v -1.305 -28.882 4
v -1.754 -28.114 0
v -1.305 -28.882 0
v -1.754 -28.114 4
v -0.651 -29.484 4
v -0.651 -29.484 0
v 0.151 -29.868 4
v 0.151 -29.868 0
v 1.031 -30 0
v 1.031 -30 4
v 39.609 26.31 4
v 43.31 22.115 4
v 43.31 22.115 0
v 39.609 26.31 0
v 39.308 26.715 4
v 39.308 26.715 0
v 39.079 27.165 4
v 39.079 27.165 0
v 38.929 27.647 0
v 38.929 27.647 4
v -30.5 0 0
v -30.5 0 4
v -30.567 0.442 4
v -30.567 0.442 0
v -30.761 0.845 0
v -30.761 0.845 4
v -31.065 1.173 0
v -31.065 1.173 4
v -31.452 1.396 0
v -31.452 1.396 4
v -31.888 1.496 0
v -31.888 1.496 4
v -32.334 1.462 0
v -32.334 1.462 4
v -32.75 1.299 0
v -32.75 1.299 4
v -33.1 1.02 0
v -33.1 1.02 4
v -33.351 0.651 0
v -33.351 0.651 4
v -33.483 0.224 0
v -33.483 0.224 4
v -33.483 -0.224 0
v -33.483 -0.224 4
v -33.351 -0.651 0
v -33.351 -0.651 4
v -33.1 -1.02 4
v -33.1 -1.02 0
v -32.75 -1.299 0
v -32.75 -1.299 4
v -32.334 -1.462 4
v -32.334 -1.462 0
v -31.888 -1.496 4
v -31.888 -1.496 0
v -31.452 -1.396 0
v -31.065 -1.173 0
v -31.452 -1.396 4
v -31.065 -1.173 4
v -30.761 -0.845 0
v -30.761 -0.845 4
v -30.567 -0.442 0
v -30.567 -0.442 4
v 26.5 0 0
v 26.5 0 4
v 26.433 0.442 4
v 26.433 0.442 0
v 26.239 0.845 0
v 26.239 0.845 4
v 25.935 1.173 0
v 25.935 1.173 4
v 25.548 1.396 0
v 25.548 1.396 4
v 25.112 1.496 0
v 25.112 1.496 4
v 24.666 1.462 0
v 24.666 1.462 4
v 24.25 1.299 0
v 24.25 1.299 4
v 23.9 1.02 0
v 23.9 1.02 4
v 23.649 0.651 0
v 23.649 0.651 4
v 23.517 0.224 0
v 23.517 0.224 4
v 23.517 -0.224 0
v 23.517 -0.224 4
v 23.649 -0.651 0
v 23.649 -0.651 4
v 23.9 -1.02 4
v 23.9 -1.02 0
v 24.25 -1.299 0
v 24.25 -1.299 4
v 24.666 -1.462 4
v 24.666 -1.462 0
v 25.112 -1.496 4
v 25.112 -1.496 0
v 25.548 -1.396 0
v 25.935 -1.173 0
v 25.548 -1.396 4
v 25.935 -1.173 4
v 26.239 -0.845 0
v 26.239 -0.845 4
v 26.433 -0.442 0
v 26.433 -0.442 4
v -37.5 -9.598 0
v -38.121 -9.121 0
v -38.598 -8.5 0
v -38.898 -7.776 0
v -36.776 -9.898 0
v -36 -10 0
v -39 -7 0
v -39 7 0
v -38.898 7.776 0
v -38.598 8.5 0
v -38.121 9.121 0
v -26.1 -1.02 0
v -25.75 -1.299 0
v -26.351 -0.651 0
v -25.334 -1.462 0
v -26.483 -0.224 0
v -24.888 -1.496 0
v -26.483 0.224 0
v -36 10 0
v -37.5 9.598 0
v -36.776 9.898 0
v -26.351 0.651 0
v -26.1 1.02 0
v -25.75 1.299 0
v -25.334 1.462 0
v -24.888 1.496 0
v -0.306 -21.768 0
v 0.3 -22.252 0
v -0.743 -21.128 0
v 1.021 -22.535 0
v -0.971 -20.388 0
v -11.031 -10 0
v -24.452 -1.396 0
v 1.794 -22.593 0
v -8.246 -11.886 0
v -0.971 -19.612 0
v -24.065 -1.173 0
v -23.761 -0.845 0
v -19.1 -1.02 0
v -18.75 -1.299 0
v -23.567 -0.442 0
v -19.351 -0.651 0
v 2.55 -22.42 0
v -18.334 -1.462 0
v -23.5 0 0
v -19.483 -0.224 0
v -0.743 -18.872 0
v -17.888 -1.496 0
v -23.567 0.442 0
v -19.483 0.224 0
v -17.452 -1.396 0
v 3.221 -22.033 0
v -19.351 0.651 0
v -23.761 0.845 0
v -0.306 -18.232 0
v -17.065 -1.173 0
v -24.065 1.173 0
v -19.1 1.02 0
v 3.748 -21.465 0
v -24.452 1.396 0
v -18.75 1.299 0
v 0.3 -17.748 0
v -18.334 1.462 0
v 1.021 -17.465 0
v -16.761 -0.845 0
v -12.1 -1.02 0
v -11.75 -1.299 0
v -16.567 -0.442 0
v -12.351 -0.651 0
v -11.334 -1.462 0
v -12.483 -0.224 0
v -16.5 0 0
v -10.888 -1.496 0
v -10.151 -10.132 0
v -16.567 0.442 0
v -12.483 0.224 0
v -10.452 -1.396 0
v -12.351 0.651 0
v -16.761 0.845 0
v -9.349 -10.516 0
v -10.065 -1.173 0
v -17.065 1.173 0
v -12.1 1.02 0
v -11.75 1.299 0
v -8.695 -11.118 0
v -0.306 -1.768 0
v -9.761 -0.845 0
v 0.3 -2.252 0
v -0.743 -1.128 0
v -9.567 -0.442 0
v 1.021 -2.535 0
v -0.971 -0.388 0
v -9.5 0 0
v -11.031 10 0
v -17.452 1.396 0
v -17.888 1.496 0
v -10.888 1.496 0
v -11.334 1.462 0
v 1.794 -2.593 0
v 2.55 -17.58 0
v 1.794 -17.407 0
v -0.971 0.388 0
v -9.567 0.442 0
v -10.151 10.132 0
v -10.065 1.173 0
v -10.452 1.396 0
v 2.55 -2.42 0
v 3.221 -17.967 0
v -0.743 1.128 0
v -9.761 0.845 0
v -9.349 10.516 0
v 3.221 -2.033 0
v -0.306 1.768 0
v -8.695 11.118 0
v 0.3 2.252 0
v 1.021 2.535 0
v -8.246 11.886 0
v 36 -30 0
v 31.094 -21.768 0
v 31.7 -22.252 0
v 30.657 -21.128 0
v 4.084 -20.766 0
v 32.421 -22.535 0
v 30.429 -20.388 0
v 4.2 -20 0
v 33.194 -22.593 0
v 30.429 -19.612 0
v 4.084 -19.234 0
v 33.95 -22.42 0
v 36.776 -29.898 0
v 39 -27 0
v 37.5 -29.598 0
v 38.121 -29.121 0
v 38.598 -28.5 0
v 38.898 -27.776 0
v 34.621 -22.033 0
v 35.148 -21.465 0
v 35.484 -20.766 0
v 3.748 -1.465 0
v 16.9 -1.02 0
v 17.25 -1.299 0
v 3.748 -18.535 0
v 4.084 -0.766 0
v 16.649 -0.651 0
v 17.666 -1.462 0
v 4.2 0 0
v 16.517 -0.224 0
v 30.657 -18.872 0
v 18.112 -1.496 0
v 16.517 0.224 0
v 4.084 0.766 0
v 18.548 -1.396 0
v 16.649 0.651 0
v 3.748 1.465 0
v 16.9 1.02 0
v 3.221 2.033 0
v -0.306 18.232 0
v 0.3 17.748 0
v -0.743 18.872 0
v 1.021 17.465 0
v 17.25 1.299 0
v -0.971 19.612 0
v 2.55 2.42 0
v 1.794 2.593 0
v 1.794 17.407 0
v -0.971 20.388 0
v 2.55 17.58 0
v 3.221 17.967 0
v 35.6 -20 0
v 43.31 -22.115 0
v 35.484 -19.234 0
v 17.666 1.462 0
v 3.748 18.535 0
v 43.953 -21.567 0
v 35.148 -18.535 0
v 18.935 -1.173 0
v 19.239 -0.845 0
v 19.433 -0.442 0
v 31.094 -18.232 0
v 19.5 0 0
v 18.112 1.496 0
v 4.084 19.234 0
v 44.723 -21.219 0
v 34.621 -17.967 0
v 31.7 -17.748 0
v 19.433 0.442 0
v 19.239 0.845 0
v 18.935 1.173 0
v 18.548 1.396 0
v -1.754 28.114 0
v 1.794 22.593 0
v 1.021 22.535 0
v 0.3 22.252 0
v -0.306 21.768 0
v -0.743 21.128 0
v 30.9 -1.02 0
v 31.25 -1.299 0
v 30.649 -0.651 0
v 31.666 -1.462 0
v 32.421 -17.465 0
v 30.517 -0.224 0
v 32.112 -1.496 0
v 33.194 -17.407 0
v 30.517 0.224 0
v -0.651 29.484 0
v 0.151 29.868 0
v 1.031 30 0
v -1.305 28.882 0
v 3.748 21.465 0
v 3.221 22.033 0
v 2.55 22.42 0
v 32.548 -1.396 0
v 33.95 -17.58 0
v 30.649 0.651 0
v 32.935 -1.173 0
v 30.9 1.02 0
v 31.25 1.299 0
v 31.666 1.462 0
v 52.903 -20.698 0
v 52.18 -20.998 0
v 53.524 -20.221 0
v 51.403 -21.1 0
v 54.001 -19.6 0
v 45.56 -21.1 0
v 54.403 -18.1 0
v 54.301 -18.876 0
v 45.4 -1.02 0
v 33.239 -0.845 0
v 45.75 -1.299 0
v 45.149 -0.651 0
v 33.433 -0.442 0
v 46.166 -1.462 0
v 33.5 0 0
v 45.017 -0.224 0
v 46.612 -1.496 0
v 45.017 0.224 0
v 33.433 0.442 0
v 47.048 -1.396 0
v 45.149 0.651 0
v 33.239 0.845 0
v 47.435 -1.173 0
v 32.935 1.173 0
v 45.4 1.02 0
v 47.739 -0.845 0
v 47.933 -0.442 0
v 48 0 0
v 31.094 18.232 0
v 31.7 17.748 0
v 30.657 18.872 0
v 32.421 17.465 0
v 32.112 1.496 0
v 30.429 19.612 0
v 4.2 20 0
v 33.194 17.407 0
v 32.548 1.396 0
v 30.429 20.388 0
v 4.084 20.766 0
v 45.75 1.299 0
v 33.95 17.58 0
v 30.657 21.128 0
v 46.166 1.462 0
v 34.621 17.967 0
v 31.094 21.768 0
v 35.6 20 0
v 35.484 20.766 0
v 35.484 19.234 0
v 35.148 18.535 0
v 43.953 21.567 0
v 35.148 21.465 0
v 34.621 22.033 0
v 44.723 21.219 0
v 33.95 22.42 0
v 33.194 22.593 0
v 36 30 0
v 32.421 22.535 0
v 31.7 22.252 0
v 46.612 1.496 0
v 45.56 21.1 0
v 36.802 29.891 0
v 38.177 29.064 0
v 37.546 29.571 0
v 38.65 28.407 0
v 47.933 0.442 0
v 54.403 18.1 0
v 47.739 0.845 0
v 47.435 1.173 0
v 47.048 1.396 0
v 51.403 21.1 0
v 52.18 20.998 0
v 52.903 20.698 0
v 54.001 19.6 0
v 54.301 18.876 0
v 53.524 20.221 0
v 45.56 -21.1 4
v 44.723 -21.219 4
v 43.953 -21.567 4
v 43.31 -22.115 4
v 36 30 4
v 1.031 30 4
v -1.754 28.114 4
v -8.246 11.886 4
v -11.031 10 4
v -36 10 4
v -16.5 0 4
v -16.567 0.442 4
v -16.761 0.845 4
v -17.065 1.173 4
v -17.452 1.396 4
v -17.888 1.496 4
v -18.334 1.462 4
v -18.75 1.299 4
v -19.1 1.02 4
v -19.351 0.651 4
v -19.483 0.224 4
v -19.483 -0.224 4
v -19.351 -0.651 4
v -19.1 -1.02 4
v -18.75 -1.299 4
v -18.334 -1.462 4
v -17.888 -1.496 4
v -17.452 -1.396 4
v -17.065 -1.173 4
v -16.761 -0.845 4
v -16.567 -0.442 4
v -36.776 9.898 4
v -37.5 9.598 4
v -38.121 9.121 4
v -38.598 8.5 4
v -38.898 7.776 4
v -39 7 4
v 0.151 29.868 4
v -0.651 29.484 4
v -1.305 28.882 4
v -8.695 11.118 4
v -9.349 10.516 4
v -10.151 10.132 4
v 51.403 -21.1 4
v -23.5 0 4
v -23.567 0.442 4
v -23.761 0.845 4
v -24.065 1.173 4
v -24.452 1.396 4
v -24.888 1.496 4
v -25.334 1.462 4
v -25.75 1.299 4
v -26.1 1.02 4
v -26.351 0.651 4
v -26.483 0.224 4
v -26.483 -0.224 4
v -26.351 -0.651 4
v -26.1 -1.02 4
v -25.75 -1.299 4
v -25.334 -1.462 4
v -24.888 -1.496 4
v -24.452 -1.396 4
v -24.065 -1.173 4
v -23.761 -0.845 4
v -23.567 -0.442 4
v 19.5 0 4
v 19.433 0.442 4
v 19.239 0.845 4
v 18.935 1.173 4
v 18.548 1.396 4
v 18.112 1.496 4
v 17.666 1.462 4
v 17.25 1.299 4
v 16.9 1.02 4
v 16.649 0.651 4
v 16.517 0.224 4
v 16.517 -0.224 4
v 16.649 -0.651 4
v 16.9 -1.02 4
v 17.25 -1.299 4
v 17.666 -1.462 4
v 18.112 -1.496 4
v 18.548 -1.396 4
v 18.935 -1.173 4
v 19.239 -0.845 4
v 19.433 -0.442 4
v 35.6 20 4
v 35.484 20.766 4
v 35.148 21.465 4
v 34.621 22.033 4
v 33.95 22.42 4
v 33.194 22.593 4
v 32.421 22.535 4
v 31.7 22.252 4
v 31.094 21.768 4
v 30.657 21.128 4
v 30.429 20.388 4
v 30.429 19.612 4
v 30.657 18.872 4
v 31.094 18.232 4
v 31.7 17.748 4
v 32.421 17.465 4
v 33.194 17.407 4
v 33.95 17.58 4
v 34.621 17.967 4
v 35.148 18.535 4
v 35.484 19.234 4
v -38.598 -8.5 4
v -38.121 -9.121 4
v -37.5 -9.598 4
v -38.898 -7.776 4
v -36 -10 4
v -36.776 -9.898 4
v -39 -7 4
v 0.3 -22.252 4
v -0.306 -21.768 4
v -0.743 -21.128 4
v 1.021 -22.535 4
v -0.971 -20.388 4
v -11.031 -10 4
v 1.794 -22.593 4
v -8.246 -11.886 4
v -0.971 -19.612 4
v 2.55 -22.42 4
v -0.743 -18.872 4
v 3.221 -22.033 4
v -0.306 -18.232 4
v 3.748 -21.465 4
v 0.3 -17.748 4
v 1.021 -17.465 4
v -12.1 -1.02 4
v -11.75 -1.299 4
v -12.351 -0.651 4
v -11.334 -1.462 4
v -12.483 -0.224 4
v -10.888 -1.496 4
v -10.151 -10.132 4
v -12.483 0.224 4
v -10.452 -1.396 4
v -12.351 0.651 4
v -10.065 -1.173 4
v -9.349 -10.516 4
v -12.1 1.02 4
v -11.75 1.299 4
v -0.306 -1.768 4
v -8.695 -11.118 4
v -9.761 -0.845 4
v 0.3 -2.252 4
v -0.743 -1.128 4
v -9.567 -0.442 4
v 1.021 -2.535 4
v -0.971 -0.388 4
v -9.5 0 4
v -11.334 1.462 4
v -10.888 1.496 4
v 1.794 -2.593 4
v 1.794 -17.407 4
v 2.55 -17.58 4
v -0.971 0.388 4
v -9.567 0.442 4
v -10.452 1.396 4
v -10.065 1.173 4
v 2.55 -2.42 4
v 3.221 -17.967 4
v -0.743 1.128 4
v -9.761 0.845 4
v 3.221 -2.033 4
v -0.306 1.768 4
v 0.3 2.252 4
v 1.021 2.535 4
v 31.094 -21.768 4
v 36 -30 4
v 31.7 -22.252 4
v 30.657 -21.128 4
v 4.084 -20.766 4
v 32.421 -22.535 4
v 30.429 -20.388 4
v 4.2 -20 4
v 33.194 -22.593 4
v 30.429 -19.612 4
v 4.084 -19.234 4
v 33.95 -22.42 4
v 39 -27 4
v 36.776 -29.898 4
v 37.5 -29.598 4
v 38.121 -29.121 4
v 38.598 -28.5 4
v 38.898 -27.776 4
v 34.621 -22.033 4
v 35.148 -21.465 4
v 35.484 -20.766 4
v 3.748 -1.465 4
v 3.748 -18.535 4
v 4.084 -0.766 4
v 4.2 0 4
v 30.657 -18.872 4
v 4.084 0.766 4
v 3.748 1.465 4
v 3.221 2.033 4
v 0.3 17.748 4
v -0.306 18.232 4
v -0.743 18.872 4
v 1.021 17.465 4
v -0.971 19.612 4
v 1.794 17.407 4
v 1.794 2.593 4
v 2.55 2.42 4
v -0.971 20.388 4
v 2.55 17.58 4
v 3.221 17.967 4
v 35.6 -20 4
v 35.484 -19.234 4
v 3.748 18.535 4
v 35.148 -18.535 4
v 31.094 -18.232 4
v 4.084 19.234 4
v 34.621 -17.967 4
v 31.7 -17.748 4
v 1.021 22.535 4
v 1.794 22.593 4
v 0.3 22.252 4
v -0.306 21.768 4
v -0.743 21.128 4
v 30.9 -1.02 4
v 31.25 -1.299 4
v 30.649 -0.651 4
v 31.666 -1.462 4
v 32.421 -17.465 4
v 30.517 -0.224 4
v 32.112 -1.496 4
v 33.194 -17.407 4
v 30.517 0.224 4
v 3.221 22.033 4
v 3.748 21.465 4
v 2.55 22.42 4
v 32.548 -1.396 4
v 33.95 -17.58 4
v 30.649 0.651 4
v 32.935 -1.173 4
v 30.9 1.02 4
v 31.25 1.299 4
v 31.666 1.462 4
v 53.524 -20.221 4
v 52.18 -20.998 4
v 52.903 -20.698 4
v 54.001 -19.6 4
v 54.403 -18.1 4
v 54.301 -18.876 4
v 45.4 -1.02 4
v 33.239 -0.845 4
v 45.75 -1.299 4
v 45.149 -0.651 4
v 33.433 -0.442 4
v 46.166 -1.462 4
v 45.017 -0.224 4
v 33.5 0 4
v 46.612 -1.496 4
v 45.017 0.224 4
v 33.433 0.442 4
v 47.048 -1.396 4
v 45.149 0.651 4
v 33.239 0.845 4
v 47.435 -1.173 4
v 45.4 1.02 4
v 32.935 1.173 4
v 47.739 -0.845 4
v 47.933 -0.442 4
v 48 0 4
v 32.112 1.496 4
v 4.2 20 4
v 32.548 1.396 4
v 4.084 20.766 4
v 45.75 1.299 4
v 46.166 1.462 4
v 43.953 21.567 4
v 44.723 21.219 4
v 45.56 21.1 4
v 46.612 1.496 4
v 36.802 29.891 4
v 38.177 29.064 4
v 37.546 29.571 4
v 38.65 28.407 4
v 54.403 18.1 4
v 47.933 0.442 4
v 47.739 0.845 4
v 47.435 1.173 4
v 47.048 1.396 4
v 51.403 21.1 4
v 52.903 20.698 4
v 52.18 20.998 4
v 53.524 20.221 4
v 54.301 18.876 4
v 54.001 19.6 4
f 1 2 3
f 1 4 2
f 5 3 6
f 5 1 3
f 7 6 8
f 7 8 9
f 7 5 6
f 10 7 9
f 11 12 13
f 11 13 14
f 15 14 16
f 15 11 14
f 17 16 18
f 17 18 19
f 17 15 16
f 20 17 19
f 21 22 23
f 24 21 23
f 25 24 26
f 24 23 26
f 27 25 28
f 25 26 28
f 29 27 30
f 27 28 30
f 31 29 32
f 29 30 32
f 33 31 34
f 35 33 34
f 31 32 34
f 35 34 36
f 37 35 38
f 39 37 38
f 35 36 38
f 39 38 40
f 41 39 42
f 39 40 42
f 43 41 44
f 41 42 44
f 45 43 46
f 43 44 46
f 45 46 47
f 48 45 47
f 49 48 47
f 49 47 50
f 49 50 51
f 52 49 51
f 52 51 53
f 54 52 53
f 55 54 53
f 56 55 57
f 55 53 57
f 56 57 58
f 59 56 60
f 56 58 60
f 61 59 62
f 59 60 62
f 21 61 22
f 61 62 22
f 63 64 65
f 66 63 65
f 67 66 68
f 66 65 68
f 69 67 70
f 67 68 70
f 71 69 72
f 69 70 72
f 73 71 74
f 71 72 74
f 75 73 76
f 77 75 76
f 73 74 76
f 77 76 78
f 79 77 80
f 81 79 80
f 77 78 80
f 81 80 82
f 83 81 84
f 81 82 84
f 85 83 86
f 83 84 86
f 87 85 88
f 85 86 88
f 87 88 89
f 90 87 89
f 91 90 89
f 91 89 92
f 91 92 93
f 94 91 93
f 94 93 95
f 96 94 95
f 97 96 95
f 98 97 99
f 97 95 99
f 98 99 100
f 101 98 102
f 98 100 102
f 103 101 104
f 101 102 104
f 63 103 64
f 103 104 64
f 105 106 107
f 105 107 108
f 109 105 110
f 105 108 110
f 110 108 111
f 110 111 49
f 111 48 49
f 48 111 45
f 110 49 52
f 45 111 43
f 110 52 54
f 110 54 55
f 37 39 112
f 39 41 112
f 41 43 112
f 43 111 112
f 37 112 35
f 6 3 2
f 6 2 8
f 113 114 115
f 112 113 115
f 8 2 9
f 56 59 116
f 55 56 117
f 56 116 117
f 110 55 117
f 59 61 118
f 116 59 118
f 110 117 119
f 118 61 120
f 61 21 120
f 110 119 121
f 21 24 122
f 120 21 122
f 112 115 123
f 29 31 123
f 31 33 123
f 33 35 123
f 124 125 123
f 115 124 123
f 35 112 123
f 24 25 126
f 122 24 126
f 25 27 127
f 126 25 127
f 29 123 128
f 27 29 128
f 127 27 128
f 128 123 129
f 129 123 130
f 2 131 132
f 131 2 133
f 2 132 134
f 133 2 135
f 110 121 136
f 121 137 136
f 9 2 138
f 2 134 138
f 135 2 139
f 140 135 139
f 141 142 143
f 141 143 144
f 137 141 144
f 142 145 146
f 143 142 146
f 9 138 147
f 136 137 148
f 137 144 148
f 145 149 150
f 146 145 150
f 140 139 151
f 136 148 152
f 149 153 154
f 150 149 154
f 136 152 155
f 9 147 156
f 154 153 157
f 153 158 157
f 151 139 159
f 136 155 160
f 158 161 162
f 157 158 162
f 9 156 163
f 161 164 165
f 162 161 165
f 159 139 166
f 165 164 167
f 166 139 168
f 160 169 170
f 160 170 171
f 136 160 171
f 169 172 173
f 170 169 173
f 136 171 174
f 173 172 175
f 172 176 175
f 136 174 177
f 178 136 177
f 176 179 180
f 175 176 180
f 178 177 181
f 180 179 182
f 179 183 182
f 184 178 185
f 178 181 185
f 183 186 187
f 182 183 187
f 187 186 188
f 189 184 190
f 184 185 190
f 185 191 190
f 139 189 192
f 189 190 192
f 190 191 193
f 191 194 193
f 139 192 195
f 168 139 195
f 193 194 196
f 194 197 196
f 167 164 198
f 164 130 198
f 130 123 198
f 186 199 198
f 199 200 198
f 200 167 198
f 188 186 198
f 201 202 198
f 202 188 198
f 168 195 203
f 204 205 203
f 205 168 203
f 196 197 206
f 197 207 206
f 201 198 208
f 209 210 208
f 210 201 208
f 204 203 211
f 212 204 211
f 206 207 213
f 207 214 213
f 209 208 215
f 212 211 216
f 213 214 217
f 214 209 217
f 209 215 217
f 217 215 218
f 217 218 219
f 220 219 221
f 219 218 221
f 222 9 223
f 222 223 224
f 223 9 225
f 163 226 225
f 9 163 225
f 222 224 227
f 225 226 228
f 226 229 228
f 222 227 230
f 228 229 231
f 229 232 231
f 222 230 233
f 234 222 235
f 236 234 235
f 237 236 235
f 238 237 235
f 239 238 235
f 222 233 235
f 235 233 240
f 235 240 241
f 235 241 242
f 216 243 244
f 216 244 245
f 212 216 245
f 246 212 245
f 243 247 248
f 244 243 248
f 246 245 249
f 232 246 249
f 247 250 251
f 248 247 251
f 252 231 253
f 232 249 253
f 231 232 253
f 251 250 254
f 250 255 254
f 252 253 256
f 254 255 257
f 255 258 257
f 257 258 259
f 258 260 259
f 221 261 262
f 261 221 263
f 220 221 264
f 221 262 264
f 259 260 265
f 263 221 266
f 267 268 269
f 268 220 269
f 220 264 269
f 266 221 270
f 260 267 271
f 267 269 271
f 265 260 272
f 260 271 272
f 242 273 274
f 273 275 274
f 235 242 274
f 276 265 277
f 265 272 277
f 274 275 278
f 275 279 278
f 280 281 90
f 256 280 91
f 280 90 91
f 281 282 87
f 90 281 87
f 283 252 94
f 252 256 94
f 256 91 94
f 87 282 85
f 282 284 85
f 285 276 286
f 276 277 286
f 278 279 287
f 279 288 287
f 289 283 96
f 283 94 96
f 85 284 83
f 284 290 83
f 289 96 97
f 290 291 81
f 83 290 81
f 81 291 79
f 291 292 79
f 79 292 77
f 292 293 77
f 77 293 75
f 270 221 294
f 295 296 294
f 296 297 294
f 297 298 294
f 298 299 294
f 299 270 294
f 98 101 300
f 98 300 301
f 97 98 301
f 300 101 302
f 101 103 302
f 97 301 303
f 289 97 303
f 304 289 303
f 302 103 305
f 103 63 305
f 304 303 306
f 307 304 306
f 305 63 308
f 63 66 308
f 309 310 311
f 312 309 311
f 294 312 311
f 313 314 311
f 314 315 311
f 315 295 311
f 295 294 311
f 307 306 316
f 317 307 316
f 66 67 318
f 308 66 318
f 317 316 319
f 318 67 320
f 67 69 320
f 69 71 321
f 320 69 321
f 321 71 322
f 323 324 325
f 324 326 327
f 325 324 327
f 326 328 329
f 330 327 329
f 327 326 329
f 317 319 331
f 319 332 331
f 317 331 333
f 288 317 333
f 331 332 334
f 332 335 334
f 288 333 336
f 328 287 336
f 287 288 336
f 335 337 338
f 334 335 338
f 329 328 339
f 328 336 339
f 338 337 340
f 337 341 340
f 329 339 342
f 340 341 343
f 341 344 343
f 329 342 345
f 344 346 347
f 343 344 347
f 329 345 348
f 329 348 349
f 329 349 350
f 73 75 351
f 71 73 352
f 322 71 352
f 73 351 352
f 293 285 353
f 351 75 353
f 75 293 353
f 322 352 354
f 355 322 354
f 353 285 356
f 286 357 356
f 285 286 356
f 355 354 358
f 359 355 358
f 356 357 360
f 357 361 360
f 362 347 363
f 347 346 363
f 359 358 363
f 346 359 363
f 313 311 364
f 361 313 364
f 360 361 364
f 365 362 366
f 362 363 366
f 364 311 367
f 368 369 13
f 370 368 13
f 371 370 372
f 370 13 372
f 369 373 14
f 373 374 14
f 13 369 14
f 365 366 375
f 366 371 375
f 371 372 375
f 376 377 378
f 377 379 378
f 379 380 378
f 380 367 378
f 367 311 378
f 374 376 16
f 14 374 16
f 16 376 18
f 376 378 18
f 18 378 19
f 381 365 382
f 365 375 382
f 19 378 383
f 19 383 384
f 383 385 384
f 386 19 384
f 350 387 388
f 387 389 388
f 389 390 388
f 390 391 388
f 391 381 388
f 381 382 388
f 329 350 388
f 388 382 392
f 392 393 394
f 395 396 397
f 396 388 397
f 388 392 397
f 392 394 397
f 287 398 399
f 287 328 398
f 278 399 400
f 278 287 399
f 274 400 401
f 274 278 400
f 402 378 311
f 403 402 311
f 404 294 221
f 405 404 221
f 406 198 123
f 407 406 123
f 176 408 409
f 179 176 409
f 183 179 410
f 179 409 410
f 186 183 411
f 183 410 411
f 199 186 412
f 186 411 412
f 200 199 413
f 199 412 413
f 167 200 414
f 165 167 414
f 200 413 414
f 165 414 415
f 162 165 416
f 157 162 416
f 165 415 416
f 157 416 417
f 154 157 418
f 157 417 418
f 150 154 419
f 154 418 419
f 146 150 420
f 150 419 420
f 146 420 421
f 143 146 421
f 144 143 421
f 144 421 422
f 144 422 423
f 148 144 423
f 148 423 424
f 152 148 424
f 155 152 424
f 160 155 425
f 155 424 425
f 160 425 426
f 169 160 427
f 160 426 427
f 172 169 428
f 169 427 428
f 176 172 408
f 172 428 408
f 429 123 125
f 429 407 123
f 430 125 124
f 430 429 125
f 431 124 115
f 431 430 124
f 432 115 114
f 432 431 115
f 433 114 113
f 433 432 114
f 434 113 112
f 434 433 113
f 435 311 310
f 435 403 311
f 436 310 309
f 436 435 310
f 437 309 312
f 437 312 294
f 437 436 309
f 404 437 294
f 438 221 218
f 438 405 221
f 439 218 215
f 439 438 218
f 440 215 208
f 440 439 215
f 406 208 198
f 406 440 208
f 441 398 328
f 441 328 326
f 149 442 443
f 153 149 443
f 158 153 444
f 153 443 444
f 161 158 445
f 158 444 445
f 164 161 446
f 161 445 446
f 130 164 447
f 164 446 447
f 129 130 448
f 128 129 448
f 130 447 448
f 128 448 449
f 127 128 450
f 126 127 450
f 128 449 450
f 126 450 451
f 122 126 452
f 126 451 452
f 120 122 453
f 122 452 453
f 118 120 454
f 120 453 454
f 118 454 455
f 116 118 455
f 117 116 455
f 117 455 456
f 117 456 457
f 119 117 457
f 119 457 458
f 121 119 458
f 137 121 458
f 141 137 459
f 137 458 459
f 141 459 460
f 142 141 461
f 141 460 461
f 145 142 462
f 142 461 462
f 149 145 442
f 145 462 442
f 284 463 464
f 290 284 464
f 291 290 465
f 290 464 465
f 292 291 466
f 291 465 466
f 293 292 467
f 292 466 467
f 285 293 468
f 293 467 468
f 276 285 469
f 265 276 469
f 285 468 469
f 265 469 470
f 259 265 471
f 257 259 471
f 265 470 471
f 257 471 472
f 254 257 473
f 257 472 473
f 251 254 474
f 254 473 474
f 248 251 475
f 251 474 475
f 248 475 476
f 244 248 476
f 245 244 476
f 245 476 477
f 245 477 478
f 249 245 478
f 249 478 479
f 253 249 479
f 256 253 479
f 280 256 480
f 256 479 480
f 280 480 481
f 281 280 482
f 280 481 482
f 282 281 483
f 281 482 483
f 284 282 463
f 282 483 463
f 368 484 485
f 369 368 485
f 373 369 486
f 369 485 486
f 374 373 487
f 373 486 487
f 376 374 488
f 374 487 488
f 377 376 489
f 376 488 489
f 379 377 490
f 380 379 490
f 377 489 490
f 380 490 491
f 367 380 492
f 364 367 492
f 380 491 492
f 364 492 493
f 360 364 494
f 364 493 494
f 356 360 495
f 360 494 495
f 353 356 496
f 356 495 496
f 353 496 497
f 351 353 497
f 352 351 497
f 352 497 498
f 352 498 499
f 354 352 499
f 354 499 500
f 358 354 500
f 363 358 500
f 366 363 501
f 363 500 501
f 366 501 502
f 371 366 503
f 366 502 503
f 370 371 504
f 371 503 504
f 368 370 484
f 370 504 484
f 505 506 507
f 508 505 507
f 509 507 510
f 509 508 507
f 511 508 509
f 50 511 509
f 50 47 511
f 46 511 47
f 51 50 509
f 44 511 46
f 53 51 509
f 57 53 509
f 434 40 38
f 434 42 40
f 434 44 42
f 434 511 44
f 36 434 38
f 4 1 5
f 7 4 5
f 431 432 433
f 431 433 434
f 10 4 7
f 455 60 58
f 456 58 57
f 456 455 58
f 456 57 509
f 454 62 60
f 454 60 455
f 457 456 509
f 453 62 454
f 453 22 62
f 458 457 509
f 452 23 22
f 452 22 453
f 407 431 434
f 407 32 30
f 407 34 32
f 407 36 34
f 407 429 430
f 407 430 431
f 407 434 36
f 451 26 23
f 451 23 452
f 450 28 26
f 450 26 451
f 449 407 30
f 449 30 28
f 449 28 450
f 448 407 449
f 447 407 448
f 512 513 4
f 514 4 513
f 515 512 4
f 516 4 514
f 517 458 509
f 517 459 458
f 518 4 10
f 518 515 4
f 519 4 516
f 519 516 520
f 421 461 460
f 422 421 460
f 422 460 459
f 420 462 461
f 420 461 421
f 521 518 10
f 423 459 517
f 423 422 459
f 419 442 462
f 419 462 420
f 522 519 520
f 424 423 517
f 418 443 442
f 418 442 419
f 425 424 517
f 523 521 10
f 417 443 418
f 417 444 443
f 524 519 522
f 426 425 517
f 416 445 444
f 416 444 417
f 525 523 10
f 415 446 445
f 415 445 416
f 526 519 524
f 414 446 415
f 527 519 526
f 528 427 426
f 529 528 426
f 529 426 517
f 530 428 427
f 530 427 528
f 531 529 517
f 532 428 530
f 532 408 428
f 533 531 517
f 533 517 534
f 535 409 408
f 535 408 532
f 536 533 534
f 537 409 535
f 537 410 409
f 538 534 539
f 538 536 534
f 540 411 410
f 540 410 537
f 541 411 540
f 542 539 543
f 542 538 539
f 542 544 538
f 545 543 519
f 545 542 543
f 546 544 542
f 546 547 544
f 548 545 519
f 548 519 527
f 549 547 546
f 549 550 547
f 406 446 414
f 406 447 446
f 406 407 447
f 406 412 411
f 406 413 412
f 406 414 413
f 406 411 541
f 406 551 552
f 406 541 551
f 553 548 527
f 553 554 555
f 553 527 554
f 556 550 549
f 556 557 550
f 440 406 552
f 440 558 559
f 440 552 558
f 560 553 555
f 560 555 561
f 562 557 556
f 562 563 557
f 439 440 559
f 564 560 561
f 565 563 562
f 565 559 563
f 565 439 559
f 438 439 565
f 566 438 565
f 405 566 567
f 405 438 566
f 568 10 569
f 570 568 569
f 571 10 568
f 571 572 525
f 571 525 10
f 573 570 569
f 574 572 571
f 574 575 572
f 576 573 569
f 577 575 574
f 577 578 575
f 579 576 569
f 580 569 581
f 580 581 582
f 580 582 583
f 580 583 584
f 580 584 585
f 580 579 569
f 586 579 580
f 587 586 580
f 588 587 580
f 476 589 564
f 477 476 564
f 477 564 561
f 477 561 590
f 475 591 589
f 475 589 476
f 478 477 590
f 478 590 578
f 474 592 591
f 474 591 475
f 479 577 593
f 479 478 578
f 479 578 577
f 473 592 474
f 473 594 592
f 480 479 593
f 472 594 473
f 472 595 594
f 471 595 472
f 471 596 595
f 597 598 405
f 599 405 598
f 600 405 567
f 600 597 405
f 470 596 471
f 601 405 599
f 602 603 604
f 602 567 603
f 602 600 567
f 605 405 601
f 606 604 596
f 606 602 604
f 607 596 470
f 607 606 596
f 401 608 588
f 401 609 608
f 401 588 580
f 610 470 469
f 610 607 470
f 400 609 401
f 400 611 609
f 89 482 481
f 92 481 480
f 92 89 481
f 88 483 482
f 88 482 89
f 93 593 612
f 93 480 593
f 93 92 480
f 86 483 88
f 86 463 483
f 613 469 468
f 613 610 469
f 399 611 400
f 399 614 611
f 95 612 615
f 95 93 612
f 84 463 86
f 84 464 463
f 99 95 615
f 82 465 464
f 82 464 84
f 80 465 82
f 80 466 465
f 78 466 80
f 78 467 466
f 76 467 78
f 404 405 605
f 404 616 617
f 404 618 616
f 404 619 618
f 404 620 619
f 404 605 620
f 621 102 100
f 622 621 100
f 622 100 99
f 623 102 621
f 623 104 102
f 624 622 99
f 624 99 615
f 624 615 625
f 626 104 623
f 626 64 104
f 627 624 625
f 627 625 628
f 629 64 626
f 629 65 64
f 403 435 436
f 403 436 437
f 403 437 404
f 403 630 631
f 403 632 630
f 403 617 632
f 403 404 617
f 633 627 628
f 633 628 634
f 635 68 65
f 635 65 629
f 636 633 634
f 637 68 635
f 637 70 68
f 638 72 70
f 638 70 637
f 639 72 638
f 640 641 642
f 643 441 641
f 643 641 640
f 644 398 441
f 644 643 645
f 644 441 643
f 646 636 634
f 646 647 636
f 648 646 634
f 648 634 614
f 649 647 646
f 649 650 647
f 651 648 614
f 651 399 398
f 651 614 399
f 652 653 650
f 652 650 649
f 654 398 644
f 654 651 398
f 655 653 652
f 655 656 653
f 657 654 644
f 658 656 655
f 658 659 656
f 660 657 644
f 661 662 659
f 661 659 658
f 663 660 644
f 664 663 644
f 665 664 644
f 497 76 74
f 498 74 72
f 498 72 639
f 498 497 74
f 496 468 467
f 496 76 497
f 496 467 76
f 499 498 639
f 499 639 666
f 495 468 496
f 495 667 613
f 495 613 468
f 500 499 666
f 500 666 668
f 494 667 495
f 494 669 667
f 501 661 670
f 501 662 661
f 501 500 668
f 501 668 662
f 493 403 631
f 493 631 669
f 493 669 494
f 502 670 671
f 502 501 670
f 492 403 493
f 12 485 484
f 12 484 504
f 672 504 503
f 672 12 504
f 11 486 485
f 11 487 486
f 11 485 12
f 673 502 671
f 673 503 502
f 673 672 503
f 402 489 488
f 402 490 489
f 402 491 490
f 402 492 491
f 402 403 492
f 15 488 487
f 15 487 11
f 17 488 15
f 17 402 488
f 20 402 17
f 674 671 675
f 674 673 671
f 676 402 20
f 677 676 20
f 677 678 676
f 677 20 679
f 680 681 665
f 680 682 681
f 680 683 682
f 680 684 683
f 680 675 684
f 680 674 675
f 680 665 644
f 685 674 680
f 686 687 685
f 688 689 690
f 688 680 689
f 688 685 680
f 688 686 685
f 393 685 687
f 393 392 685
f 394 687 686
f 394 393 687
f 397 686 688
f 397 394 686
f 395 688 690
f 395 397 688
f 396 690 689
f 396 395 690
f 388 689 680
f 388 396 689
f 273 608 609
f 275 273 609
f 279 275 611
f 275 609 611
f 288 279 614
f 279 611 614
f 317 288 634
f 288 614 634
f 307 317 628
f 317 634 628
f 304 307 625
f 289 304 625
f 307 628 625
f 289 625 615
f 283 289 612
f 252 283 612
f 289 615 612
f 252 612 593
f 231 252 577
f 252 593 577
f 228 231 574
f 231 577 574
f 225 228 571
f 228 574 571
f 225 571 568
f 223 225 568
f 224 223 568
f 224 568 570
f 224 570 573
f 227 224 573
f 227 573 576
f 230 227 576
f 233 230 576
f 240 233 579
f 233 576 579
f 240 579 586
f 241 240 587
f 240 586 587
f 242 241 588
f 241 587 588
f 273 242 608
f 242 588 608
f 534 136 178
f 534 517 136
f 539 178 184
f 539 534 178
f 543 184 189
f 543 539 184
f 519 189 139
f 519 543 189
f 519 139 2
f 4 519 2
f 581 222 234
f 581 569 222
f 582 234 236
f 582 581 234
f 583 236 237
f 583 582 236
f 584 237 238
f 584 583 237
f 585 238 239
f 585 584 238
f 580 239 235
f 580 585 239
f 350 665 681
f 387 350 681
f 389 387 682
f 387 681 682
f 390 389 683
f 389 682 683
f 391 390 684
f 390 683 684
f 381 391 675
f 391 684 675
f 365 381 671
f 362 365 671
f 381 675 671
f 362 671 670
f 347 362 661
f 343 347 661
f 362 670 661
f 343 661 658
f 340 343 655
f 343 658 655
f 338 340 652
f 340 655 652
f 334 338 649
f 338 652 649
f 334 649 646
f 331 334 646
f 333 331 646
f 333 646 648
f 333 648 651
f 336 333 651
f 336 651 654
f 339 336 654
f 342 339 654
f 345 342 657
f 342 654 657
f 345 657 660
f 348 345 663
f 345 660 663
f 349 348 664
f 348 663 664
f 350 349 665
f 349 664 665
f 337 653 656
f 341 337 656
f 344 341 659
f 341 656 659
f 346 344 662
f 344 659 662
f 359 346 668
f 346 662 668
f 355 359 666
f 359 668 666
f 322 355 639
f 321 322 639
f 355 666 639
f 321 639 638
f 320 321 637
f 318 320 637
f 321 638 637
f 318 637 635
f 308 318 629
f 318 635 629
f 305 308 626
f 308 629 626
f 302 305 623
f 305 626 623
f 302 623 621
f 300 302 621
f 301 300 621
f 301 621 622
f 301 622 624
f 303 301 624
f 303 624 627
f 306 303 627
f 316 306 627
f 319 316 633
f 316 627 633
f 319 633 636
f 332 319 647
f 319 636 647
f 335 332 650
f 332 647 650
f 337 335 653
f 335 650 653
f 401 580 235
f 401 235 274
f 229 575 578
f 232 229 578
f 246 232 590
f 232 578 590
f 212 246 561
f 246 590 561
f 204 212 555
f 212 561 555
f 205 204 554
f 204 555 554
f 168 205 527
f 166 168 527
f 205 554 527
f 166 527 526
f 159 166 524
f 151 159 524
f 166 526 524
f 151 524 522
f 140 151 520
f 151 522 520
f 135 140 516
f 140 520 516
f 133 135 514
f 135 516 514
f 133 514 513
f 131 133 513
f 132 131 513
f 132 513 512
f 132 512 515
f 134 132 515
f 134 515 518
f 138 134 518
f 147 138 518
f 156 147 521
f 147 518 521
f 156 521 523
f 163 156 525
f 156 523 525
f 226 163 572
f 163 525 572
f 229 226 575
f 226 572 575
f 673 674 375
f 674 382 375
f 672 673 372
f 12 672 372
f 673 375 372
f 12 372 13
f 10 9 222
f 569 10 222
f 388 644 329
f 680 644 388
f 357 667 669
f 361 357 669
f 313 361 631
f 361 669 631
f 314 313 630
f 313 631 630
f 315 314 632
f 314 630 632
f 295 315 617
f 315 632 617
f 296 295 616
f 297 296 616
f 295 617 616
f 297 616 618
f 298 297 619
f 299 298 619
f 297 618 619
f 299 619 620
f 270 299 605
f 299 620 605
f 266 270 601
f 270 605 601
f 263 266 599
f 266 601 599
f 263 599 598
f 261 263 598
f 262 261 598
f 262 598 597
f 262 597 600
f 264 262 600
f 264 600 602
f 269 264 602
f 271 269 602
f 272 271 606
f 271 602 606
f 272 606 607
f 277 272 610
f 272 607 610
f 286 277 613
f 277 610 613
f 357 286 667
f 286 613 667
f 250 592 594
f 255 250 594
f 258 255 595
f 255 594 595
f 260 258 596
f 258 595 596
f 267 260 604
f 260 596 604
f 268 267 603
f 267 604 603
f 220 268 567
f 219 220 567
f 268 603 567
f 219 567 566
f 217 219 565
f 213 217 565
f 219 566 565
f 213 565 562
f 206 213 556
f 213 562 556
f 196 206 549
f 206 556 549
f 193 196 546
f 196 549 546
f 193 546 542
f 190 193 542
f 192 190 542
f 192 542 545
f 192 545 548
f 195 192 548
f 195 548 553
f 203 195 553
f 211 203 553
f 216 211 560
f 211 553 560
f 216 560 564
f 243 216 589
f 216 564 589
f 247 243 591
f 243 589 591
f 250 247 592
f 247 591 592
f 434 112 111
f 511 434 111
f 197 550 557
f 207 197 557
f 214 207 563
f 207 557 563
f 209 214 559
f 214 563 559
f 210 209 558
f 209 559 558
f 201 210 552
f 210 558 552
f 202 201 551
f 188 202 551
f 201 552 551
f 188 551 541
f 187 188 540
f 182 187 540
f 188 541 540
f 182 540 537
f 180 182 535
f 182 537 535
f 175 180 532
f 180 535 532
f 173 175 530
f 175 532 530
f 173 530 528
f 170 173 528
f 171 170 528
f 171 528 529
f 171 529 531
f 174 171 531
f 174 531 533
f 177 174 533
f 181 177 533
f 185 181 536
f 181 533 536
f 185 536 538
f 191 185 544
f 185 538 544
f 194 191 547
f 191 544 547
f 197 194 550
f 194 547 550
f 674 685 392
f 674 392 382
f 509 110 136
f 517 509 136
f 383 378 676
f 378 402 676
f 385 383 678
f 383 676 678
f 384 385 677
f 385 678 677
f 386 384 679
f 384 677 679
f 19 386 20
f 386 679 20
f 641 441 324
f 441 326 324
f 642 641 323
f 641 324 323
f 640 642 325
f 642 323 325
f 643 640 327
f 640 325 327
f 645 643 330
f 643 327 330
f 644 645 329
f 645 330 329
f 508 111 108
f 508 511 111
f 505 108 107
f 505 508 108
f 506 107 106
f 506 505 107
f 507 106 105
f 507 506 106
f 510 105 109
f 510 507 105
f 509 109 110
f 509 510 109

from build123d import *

# Parameters (mm, degrees)
BOSS_EXTRUDE1_DEPTH = 4
FILLET1_R           = 3
SKETCH3_R           = 2.6
CUT_EXTRUDE1_DEPTH  = 4
SKETCH4_R           = 1.5
CUT_EXTRUDE2_DEPTH  = 4
SKETCH5_W           = 15
SKETCH5_H           = 20
BOSS_EXTRUDE2_DEPTH = 4
BOSS_EXTRUDE3_DEPTH = 4
SKETCH7_R           = 1.5
CUT_EXTRUDE3_DEPTH  = 4
BOSS_EXTRUDE4_DEPTH = 4
SKETCH10_R          = 11.5
CUT_EXTRUDE4_DEPTH  = 4
SKETCH14_R          = 1.5
CUT_EXTRUDE5_DEPTH  = 4
FILLET2_R           = 3
SKETCH17_W          = 41.796836064
SKETCH17_H          = 42.2
CUT_EXTRUDE6_DEPTH  = 10
FILLET3_R           = 3


with BuildPart() as part:
    # Sketch1 → Boss-Extrude1 (new body)
    with BuildSketch(Plane.XY):
        Polygon((39, 10), (39, 30), (-1, 30), (-9, 10), (-39, 10), (-39, -10), (-9, -10), (-1, -30), (39, -30), (39, -10), align=None)
    extrude(amount=BOSS_EXTRUDE1_DEPTH)

    # Fillet1
    fillet1_edges = [part.edges().sort_by_distance(p)[0] for p in [
        (39, -30, 2),
        (-1, -30, 2),
        (-9, -10, 2),
        (-39, -10, 2),
        (-39, 10, 2),
        (-9, 10, 2),
        (-1, 30, 2),
        (39, 30, 2),
    ]]
    fillet(fillet1_edges, radius=FILLET1_R)

    # Sketch3 → Cut-Extrude1 (cut)
    with BuildSketch(Plane.XY.offset(4)):
        with Locations((33, 20)):
            Circle(SKETCH3_R)
        with Locations((1.6, 20)):
            Circle(SKETCH3_R)
        with Locations((33, -20)):
            Circle(SKETCH3_R)
        with Locations((1.6, -20)):
            Circle(SKETCH3_R)
        with Locations((1.6, 0)):
            Circle(SKETCH3_R)
    extrude(amount=-CUT_EXTRUDE1_DEPTH, mode=Mode.SUBTRACT)

    # Sketch4 → Cut-Extrude2 (cut)
    with BuildSketch(Plane.XY.offset(4)):
        with Locations((-32, 0)):
            Circle(SKETCH4_R)
        with Locations((-25, 0)):
            Circle(SKETCH4_R)
        with Locations((-18, 0)):
            Circle(SKETCH4_R)
        with Locations((-11, 0)):
            Circle(SKETCH4_R)
        with Locations((32, 0)):
            Circle(SKETCH4_R)
        with Locations((25, 0)):
            Circle(SKETCH4_R)
        with Locations((18, 0)):
            Circle(SKETCH4_R)
    extrude(amount=-CUT_EXTRUDE2_DEPTH, mode=Mode.SUBTRACT)

    # Sketch5 → Boss-Extrude2 (add)
    with BuildSketch(Plane.XY.offset(4)):
        with Locations((46.5, 0)):
            Rectangle(SKETCH5_W, SKETCH5_H)
    extrude(amount=-BOSS_EXTRUDE2_DEPTH)

    # Sketch6 → Boss-Extrude3 (add)
    with BuildSketch(Plane.XY.offset(4)):
        Polygon((39, 10), (54, 10), (39, 27), align=None)
        Polygon((54, -10), (39, -10), (39, -27), align=None)
    extrude(amount=-BOSS_EXTRUDE3_DEPTH)

    # Sketch7 → Cut-Extrude3 (cut)
    with BuildSketch(Plane.XY.offset(4)):
        with Locations((46.5, 0)):
            Circle(SKETCH7_R)
    extrude(amount=-CUT_EXTRUDE3_DEPTH, mode=Mode.SUBTRACT)

    # Sketch8 → Boss-Extrude4 (add)
    with BuildSketch(Plane.XY.offset(4)):
        Polygon((54, -10), (54, -21.1), (96.2, -21.1), (96.2, 21.1), (54, 21.1), (54, 10), align=None)
        Polygon((44.205882353, 21.1), (54, 10), (54, 21.1), align=None)
        Polygon((44.205882353, -21.1), (54, -21.1), (54, -10), align=None)
    extrude(amount=-BOSS_EXTRUDE4_DEPTH)

    # Sketch10 → Cut-Extrude4 (cut)
    with BuildSketch(Plane.XY.offset(4)):
        with Locations((74.8, 0)):
            Circle(SKETCH10_R)
    extrude(amount=-CUT_EXTRUDE4_DEPTH, mode=Mode.SUBTRACT)

    # Sketch14 → Cut-Extrude5 (cut)
    with BuildSketch(Plane.XY.offset(4)):
        with Locations((90.674547238, 15.874547238)):
            Circle(SKETCH14_R)
        with Locations((58.925452762, -15.874547238)):
            Circle(SKETCH14_R)
        with Locations((58.925452762, 15.874547238)):
            Circle(SKETCH14_R)
        with Locations((90.674547238, -15.874547238)):
            Circle(SKETCH14_R)
    extrude(amount=-CUT_EXTRUDE5_DEPTH, mode=Mode.SUBTRACT)

    # Fillet2
    fillet2_edges = [part.edges().sort_by_distance(p)[0] for p in [
        (96.2, -21.1, 2),
        (44.205882353, -21.1, 2),
        (44.205882353, 21.1, 2),
        (96.2, 21.1, 2),
        (39, 27, 2),
    ]]
    fillet(fillet2_edges, radius=FILLET2_R)

    # Sketch17 → Cut-Extrude6 (cut)
    with BuildSketch(Plane.XY.offset(4)):
        with Locations((75.301581968, 0)):
            Rectangle(SKETCH17_W, SKETCH17_H)
    extrude(amount=-CUT_EXTRUDE6_DEPTH, mode=Mode.SUBTRACT)

    # Fillet3
    fillet3_edges = [part.edges().sort_by_distance(p)[0] for p in [
        (54.403163936, -21.1, 2),
        (54.403163936, 21.1, 2),
    ]]
    fillet(fillet3_edges, radius=FILLET3_R)


solid = part.part
